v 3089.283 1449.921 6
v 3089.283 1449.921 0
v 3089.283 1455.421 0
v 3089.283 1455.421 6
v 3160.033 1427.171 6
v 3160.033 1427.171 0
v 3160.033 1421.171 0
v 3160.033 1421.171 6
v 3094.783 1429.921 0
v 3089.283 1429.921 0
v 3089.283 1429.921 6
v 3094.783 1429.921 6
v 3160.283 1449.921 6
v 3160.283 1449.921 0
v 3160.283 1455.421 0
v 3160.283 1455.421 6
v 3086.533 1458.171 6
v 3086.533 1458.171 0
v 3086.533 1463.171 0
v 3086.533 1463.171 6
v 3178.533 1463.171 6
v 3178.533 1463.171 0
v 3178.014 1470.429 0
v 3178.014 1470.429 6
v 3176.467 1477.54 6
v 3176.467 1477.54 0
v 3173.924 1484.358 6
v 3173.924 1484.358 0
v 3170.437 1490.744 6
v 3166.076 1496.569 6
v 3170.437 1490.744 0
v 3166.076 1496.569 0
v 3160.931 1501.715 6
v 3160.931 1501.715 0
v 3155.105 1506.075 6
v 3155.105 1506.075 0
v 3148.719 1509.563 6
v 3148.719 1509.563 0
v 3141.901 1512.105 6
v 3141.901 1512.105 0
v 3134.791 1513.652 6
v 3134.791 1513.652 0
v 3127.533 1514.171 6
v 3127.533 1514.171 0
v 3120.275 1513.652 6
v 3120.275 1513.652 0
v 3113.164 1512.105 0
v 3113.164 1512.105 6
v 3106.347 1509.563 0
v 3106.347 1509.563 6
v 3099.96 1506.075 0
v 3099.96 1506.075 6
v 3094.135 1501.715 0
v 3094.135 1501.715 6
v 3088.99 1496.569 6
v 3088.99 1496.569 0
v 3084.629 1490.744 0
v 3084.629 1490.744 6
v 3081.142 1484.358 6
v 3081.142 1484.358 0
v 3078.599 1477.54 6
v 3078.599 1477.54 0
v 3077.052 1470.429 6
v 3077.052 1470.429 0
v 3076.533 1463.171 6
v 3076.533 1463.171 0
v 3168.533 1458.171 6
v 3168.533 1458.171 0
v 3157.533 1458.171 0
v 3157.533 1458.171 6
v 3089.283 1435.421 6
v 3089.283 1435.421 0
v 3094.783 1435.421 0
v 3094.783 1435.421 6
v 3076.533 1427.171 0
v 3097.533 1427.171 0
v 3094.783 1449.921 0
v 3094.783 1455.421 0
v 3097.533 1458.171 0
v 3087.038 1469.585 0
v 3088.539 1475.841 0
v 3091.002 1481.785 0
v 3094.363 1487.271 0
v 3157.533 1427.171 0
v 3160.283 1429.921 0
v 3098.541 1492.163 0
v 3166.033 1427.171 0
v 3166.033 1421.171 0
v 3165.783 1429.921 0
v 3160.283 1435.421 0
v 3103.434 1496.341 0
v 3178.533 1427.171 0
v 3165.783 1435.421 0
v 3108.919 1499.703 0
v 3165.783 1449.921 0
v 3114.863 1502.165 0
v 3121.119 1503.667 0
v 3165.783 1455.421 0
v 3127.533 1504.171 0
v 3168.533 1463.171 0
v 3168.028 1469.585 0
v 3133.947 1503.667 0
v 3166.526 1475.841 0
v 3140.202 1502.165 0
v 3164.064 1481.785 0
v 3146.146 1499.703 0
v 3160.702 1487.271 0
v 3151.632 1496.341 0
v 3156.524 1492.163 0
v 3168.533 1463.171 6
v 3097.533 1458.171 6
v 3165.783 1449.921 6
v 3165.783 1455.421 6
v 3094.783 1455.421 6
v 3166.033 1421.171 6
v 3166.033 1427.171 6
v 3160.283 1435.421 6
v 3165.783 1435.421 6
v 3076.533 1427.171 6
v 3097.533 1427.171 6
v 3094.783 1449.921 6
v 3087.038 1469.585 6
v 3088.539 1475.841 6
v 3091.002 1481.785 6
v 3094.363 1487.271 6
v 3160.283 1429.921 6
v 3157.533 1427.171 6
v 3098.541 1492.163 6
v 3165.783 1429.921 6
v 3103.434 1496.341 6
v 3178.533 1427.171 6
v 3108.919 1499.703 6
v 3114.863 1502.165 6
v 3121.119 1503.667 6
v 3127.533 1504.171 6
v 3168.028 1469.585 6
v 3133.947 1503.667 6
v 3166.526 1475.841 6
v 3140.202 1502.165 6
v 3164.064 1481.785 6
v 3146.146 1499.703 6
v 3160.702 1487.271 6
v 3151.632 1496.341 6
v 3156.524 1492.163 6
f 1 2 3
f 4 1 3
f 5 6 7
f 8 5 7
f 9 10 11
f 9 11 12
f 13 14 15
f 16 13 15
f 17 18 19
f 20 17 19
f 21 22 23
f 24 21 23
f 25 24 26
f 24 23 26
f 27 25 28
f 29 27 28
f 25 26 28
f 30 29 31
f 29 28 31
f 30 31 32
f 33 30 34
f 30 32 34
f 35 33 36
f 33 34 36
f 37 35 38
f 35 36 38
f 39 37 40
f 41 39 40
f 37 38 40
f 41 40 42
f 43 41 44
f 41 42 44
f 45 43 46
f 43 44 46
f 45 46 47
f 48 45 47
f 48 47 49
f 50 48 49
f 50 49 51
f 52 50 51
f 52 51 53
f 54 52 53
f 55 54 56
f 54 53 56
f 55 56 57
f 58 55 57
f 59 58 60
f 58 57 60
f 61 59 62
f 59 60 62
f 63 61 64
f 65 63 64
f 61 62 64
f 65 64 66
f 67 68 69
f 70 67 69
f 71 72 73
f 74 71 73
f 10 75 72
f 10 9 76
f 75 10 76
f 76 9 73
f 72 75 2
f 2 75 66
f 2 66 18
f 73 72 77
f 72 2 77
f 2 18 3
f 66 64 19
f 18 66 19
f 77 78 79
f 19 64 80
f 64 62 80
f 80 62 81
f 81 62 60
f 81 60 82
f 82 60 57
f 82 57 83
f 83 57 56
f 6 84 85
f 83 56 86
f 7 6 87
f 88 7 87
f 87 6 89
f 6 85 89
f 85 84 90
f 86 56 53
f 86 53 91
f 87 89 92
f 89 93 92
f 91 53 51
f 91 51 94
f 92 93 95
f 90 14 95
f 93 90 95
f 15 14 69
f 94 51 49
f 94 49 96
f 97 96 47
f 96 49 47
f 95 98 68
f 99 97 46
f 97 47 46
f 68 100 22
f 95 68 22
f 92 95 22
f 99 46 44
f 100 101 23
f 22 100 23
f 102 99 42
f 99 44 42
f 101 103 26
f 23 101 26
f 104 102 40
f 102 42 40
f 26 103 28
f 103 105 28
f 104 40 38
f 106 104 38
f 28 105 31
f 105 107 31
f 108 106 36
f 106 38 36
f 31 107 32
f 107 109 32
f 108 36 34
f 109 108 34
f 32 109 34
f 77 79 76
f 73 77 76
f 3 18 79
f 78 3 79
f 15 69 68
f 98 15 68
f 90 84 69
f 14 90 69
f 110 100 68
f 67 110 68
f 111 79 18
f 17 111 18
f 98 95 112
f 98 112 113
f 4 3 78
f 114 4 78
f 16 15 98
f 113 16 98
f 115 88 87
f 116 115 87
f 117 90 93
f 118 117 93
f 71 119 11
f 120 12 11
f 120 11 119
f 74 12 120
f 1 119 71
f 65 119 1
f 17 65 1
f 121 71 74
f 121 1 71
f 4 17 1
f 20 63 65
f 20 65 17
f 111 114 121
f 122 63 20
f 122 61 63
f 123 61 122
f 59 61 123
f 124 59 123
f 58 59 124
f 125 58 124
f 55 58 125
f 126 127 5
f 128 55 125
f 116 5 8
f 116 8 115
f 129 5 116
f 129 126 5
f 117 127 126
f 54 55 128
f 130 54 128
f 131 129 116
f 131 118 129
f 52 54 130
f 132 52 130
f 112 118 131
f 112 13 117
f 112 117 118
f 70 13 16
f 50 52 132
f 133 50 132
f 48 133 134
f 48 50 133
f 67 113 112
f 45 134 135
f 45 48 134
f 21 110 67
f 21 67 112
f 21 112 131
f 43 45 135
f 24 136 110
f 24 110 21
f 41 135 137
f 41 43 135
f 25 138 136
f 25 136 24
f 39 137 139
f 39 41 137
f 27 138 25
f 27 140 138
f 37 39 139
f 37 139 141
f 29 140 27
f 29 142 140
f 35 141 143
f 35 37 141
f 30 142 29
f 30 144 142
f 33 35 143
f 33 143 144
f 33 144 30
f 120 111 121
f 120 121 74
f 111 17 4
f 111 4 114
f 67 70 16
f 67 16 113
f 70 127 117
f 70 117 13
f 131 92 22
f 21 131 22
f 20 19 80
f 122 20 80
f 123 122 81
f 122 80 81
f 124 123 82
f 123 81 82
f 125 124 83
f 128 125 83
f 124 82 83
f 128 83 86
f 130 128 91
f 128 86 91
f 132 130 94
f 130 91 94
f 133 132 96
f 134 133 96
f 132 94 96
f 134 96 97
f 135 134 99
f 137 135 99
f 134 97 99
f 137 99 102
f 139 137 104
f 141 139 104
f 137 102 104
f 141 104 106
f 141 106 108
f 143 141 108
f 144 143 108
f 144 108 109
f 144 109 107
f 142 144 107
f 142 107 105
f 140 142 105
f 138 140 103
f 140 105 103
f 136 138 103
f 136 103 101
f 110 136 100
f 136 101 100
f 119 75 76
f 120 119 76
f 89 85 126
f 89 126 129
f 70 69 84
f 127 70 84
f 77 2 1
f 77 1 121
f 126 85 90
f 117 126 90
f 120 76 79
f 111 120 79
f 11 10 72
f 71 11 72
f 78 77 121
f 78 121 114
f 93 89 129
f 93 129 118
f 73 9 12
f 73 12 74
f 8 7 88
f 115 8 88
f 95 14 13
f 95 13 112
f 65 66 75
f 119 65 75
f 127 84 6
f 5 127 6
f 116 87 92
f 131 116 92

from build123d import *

# Parameters (mm, degrees)
MODEL_W             = 5.5
MODEL_H             = 5.5
BOSS_EXTRUDE1_DEPTH = 6


with BuildPart() as part:
    # Model → Boss-Extrude1 (new body)
    with BuildSketch(Plane.XY):
        with BuildLine():
            Line((3076.532777825, 1463.171342736), (3076.532777825, 1427.171342736))
            Line((3076.532777825, 1427.171342736), (3086.532777825, 1427.171342736))
            Line((3086.532777825, 1427.171342736), (3097.532777825, 1427.171342736))
            Line((3097.532777825, 1427.171342736), (3097.532777825, 1458.171342736))
            Line((3097.532777825, 1458.171342736), (3086.532777825, 1458.171342736))
            Line((3086.532777825, 1458.171342736), (3086.532777825, 1463.171342736))
            ThreePointArc((3086.532777825, 1463.171342736), (3127.532777825, 1504.171342736), (3168.532777825, 1463.171342736))
            Line((3168.532777825, 1463.171342736), (3168.532777825, 1458.171342736))
            Line((3168.532777825, 1458.171342736), (3157.532777825, 1458.171342736))
            Line((3157.532777825, 1458.171342736), (3157.532777825, 1427.171342736))
            Line((3157.532777825, 1427.171342736), (3160.032777825, 1427.171342736))
            Line((3160.032777825, 1427.171342736), (3160.032777825, 1421.171342736))
            Line((3160.032777825, 1421.171342736), (3166.032777825, 1421.171342736))
            Line((3166.032777825, 1421.171342736), (3166.032777825, 1427.171342736))
            Line((3166.032777825, 1427.171342736), (3178.532777825, 1427.171342736))
            Line((3178.532777825, 1427.171342736), (3178.532777825, 1463.171342736))
            ThreePointArc((3178.532777825, 1463.171342736), (3127.532777825, 1514.171342736), (3076.532777825, 1463.171342736))
        make_face()
        with Locations((3163.032777825, 1432.671342736)):
            Rectangle(MODEL_W, MODEL_H, mode=Mode.SUBTRACT)
        with Locations((3163.032777825, 1452.671342736)):
            Rectangle(MODEL_W, MODEL_H, mode=Mode.SUBTRACT)
        with Locations((3092.032777825, 1432.671342736)):
            Rectangle(MODEL_W, MODEL_H, mode=Mode.SUBTRACT)
        with Locations((3092.032777825, 1452.671342736)):
            Rectangle(MODEL_W, MODEL_H, mode=Mode.SUBTRACT)
    extrude(amount=BOSS_EXTRUDE1_DEPTH)


solid = part.part
